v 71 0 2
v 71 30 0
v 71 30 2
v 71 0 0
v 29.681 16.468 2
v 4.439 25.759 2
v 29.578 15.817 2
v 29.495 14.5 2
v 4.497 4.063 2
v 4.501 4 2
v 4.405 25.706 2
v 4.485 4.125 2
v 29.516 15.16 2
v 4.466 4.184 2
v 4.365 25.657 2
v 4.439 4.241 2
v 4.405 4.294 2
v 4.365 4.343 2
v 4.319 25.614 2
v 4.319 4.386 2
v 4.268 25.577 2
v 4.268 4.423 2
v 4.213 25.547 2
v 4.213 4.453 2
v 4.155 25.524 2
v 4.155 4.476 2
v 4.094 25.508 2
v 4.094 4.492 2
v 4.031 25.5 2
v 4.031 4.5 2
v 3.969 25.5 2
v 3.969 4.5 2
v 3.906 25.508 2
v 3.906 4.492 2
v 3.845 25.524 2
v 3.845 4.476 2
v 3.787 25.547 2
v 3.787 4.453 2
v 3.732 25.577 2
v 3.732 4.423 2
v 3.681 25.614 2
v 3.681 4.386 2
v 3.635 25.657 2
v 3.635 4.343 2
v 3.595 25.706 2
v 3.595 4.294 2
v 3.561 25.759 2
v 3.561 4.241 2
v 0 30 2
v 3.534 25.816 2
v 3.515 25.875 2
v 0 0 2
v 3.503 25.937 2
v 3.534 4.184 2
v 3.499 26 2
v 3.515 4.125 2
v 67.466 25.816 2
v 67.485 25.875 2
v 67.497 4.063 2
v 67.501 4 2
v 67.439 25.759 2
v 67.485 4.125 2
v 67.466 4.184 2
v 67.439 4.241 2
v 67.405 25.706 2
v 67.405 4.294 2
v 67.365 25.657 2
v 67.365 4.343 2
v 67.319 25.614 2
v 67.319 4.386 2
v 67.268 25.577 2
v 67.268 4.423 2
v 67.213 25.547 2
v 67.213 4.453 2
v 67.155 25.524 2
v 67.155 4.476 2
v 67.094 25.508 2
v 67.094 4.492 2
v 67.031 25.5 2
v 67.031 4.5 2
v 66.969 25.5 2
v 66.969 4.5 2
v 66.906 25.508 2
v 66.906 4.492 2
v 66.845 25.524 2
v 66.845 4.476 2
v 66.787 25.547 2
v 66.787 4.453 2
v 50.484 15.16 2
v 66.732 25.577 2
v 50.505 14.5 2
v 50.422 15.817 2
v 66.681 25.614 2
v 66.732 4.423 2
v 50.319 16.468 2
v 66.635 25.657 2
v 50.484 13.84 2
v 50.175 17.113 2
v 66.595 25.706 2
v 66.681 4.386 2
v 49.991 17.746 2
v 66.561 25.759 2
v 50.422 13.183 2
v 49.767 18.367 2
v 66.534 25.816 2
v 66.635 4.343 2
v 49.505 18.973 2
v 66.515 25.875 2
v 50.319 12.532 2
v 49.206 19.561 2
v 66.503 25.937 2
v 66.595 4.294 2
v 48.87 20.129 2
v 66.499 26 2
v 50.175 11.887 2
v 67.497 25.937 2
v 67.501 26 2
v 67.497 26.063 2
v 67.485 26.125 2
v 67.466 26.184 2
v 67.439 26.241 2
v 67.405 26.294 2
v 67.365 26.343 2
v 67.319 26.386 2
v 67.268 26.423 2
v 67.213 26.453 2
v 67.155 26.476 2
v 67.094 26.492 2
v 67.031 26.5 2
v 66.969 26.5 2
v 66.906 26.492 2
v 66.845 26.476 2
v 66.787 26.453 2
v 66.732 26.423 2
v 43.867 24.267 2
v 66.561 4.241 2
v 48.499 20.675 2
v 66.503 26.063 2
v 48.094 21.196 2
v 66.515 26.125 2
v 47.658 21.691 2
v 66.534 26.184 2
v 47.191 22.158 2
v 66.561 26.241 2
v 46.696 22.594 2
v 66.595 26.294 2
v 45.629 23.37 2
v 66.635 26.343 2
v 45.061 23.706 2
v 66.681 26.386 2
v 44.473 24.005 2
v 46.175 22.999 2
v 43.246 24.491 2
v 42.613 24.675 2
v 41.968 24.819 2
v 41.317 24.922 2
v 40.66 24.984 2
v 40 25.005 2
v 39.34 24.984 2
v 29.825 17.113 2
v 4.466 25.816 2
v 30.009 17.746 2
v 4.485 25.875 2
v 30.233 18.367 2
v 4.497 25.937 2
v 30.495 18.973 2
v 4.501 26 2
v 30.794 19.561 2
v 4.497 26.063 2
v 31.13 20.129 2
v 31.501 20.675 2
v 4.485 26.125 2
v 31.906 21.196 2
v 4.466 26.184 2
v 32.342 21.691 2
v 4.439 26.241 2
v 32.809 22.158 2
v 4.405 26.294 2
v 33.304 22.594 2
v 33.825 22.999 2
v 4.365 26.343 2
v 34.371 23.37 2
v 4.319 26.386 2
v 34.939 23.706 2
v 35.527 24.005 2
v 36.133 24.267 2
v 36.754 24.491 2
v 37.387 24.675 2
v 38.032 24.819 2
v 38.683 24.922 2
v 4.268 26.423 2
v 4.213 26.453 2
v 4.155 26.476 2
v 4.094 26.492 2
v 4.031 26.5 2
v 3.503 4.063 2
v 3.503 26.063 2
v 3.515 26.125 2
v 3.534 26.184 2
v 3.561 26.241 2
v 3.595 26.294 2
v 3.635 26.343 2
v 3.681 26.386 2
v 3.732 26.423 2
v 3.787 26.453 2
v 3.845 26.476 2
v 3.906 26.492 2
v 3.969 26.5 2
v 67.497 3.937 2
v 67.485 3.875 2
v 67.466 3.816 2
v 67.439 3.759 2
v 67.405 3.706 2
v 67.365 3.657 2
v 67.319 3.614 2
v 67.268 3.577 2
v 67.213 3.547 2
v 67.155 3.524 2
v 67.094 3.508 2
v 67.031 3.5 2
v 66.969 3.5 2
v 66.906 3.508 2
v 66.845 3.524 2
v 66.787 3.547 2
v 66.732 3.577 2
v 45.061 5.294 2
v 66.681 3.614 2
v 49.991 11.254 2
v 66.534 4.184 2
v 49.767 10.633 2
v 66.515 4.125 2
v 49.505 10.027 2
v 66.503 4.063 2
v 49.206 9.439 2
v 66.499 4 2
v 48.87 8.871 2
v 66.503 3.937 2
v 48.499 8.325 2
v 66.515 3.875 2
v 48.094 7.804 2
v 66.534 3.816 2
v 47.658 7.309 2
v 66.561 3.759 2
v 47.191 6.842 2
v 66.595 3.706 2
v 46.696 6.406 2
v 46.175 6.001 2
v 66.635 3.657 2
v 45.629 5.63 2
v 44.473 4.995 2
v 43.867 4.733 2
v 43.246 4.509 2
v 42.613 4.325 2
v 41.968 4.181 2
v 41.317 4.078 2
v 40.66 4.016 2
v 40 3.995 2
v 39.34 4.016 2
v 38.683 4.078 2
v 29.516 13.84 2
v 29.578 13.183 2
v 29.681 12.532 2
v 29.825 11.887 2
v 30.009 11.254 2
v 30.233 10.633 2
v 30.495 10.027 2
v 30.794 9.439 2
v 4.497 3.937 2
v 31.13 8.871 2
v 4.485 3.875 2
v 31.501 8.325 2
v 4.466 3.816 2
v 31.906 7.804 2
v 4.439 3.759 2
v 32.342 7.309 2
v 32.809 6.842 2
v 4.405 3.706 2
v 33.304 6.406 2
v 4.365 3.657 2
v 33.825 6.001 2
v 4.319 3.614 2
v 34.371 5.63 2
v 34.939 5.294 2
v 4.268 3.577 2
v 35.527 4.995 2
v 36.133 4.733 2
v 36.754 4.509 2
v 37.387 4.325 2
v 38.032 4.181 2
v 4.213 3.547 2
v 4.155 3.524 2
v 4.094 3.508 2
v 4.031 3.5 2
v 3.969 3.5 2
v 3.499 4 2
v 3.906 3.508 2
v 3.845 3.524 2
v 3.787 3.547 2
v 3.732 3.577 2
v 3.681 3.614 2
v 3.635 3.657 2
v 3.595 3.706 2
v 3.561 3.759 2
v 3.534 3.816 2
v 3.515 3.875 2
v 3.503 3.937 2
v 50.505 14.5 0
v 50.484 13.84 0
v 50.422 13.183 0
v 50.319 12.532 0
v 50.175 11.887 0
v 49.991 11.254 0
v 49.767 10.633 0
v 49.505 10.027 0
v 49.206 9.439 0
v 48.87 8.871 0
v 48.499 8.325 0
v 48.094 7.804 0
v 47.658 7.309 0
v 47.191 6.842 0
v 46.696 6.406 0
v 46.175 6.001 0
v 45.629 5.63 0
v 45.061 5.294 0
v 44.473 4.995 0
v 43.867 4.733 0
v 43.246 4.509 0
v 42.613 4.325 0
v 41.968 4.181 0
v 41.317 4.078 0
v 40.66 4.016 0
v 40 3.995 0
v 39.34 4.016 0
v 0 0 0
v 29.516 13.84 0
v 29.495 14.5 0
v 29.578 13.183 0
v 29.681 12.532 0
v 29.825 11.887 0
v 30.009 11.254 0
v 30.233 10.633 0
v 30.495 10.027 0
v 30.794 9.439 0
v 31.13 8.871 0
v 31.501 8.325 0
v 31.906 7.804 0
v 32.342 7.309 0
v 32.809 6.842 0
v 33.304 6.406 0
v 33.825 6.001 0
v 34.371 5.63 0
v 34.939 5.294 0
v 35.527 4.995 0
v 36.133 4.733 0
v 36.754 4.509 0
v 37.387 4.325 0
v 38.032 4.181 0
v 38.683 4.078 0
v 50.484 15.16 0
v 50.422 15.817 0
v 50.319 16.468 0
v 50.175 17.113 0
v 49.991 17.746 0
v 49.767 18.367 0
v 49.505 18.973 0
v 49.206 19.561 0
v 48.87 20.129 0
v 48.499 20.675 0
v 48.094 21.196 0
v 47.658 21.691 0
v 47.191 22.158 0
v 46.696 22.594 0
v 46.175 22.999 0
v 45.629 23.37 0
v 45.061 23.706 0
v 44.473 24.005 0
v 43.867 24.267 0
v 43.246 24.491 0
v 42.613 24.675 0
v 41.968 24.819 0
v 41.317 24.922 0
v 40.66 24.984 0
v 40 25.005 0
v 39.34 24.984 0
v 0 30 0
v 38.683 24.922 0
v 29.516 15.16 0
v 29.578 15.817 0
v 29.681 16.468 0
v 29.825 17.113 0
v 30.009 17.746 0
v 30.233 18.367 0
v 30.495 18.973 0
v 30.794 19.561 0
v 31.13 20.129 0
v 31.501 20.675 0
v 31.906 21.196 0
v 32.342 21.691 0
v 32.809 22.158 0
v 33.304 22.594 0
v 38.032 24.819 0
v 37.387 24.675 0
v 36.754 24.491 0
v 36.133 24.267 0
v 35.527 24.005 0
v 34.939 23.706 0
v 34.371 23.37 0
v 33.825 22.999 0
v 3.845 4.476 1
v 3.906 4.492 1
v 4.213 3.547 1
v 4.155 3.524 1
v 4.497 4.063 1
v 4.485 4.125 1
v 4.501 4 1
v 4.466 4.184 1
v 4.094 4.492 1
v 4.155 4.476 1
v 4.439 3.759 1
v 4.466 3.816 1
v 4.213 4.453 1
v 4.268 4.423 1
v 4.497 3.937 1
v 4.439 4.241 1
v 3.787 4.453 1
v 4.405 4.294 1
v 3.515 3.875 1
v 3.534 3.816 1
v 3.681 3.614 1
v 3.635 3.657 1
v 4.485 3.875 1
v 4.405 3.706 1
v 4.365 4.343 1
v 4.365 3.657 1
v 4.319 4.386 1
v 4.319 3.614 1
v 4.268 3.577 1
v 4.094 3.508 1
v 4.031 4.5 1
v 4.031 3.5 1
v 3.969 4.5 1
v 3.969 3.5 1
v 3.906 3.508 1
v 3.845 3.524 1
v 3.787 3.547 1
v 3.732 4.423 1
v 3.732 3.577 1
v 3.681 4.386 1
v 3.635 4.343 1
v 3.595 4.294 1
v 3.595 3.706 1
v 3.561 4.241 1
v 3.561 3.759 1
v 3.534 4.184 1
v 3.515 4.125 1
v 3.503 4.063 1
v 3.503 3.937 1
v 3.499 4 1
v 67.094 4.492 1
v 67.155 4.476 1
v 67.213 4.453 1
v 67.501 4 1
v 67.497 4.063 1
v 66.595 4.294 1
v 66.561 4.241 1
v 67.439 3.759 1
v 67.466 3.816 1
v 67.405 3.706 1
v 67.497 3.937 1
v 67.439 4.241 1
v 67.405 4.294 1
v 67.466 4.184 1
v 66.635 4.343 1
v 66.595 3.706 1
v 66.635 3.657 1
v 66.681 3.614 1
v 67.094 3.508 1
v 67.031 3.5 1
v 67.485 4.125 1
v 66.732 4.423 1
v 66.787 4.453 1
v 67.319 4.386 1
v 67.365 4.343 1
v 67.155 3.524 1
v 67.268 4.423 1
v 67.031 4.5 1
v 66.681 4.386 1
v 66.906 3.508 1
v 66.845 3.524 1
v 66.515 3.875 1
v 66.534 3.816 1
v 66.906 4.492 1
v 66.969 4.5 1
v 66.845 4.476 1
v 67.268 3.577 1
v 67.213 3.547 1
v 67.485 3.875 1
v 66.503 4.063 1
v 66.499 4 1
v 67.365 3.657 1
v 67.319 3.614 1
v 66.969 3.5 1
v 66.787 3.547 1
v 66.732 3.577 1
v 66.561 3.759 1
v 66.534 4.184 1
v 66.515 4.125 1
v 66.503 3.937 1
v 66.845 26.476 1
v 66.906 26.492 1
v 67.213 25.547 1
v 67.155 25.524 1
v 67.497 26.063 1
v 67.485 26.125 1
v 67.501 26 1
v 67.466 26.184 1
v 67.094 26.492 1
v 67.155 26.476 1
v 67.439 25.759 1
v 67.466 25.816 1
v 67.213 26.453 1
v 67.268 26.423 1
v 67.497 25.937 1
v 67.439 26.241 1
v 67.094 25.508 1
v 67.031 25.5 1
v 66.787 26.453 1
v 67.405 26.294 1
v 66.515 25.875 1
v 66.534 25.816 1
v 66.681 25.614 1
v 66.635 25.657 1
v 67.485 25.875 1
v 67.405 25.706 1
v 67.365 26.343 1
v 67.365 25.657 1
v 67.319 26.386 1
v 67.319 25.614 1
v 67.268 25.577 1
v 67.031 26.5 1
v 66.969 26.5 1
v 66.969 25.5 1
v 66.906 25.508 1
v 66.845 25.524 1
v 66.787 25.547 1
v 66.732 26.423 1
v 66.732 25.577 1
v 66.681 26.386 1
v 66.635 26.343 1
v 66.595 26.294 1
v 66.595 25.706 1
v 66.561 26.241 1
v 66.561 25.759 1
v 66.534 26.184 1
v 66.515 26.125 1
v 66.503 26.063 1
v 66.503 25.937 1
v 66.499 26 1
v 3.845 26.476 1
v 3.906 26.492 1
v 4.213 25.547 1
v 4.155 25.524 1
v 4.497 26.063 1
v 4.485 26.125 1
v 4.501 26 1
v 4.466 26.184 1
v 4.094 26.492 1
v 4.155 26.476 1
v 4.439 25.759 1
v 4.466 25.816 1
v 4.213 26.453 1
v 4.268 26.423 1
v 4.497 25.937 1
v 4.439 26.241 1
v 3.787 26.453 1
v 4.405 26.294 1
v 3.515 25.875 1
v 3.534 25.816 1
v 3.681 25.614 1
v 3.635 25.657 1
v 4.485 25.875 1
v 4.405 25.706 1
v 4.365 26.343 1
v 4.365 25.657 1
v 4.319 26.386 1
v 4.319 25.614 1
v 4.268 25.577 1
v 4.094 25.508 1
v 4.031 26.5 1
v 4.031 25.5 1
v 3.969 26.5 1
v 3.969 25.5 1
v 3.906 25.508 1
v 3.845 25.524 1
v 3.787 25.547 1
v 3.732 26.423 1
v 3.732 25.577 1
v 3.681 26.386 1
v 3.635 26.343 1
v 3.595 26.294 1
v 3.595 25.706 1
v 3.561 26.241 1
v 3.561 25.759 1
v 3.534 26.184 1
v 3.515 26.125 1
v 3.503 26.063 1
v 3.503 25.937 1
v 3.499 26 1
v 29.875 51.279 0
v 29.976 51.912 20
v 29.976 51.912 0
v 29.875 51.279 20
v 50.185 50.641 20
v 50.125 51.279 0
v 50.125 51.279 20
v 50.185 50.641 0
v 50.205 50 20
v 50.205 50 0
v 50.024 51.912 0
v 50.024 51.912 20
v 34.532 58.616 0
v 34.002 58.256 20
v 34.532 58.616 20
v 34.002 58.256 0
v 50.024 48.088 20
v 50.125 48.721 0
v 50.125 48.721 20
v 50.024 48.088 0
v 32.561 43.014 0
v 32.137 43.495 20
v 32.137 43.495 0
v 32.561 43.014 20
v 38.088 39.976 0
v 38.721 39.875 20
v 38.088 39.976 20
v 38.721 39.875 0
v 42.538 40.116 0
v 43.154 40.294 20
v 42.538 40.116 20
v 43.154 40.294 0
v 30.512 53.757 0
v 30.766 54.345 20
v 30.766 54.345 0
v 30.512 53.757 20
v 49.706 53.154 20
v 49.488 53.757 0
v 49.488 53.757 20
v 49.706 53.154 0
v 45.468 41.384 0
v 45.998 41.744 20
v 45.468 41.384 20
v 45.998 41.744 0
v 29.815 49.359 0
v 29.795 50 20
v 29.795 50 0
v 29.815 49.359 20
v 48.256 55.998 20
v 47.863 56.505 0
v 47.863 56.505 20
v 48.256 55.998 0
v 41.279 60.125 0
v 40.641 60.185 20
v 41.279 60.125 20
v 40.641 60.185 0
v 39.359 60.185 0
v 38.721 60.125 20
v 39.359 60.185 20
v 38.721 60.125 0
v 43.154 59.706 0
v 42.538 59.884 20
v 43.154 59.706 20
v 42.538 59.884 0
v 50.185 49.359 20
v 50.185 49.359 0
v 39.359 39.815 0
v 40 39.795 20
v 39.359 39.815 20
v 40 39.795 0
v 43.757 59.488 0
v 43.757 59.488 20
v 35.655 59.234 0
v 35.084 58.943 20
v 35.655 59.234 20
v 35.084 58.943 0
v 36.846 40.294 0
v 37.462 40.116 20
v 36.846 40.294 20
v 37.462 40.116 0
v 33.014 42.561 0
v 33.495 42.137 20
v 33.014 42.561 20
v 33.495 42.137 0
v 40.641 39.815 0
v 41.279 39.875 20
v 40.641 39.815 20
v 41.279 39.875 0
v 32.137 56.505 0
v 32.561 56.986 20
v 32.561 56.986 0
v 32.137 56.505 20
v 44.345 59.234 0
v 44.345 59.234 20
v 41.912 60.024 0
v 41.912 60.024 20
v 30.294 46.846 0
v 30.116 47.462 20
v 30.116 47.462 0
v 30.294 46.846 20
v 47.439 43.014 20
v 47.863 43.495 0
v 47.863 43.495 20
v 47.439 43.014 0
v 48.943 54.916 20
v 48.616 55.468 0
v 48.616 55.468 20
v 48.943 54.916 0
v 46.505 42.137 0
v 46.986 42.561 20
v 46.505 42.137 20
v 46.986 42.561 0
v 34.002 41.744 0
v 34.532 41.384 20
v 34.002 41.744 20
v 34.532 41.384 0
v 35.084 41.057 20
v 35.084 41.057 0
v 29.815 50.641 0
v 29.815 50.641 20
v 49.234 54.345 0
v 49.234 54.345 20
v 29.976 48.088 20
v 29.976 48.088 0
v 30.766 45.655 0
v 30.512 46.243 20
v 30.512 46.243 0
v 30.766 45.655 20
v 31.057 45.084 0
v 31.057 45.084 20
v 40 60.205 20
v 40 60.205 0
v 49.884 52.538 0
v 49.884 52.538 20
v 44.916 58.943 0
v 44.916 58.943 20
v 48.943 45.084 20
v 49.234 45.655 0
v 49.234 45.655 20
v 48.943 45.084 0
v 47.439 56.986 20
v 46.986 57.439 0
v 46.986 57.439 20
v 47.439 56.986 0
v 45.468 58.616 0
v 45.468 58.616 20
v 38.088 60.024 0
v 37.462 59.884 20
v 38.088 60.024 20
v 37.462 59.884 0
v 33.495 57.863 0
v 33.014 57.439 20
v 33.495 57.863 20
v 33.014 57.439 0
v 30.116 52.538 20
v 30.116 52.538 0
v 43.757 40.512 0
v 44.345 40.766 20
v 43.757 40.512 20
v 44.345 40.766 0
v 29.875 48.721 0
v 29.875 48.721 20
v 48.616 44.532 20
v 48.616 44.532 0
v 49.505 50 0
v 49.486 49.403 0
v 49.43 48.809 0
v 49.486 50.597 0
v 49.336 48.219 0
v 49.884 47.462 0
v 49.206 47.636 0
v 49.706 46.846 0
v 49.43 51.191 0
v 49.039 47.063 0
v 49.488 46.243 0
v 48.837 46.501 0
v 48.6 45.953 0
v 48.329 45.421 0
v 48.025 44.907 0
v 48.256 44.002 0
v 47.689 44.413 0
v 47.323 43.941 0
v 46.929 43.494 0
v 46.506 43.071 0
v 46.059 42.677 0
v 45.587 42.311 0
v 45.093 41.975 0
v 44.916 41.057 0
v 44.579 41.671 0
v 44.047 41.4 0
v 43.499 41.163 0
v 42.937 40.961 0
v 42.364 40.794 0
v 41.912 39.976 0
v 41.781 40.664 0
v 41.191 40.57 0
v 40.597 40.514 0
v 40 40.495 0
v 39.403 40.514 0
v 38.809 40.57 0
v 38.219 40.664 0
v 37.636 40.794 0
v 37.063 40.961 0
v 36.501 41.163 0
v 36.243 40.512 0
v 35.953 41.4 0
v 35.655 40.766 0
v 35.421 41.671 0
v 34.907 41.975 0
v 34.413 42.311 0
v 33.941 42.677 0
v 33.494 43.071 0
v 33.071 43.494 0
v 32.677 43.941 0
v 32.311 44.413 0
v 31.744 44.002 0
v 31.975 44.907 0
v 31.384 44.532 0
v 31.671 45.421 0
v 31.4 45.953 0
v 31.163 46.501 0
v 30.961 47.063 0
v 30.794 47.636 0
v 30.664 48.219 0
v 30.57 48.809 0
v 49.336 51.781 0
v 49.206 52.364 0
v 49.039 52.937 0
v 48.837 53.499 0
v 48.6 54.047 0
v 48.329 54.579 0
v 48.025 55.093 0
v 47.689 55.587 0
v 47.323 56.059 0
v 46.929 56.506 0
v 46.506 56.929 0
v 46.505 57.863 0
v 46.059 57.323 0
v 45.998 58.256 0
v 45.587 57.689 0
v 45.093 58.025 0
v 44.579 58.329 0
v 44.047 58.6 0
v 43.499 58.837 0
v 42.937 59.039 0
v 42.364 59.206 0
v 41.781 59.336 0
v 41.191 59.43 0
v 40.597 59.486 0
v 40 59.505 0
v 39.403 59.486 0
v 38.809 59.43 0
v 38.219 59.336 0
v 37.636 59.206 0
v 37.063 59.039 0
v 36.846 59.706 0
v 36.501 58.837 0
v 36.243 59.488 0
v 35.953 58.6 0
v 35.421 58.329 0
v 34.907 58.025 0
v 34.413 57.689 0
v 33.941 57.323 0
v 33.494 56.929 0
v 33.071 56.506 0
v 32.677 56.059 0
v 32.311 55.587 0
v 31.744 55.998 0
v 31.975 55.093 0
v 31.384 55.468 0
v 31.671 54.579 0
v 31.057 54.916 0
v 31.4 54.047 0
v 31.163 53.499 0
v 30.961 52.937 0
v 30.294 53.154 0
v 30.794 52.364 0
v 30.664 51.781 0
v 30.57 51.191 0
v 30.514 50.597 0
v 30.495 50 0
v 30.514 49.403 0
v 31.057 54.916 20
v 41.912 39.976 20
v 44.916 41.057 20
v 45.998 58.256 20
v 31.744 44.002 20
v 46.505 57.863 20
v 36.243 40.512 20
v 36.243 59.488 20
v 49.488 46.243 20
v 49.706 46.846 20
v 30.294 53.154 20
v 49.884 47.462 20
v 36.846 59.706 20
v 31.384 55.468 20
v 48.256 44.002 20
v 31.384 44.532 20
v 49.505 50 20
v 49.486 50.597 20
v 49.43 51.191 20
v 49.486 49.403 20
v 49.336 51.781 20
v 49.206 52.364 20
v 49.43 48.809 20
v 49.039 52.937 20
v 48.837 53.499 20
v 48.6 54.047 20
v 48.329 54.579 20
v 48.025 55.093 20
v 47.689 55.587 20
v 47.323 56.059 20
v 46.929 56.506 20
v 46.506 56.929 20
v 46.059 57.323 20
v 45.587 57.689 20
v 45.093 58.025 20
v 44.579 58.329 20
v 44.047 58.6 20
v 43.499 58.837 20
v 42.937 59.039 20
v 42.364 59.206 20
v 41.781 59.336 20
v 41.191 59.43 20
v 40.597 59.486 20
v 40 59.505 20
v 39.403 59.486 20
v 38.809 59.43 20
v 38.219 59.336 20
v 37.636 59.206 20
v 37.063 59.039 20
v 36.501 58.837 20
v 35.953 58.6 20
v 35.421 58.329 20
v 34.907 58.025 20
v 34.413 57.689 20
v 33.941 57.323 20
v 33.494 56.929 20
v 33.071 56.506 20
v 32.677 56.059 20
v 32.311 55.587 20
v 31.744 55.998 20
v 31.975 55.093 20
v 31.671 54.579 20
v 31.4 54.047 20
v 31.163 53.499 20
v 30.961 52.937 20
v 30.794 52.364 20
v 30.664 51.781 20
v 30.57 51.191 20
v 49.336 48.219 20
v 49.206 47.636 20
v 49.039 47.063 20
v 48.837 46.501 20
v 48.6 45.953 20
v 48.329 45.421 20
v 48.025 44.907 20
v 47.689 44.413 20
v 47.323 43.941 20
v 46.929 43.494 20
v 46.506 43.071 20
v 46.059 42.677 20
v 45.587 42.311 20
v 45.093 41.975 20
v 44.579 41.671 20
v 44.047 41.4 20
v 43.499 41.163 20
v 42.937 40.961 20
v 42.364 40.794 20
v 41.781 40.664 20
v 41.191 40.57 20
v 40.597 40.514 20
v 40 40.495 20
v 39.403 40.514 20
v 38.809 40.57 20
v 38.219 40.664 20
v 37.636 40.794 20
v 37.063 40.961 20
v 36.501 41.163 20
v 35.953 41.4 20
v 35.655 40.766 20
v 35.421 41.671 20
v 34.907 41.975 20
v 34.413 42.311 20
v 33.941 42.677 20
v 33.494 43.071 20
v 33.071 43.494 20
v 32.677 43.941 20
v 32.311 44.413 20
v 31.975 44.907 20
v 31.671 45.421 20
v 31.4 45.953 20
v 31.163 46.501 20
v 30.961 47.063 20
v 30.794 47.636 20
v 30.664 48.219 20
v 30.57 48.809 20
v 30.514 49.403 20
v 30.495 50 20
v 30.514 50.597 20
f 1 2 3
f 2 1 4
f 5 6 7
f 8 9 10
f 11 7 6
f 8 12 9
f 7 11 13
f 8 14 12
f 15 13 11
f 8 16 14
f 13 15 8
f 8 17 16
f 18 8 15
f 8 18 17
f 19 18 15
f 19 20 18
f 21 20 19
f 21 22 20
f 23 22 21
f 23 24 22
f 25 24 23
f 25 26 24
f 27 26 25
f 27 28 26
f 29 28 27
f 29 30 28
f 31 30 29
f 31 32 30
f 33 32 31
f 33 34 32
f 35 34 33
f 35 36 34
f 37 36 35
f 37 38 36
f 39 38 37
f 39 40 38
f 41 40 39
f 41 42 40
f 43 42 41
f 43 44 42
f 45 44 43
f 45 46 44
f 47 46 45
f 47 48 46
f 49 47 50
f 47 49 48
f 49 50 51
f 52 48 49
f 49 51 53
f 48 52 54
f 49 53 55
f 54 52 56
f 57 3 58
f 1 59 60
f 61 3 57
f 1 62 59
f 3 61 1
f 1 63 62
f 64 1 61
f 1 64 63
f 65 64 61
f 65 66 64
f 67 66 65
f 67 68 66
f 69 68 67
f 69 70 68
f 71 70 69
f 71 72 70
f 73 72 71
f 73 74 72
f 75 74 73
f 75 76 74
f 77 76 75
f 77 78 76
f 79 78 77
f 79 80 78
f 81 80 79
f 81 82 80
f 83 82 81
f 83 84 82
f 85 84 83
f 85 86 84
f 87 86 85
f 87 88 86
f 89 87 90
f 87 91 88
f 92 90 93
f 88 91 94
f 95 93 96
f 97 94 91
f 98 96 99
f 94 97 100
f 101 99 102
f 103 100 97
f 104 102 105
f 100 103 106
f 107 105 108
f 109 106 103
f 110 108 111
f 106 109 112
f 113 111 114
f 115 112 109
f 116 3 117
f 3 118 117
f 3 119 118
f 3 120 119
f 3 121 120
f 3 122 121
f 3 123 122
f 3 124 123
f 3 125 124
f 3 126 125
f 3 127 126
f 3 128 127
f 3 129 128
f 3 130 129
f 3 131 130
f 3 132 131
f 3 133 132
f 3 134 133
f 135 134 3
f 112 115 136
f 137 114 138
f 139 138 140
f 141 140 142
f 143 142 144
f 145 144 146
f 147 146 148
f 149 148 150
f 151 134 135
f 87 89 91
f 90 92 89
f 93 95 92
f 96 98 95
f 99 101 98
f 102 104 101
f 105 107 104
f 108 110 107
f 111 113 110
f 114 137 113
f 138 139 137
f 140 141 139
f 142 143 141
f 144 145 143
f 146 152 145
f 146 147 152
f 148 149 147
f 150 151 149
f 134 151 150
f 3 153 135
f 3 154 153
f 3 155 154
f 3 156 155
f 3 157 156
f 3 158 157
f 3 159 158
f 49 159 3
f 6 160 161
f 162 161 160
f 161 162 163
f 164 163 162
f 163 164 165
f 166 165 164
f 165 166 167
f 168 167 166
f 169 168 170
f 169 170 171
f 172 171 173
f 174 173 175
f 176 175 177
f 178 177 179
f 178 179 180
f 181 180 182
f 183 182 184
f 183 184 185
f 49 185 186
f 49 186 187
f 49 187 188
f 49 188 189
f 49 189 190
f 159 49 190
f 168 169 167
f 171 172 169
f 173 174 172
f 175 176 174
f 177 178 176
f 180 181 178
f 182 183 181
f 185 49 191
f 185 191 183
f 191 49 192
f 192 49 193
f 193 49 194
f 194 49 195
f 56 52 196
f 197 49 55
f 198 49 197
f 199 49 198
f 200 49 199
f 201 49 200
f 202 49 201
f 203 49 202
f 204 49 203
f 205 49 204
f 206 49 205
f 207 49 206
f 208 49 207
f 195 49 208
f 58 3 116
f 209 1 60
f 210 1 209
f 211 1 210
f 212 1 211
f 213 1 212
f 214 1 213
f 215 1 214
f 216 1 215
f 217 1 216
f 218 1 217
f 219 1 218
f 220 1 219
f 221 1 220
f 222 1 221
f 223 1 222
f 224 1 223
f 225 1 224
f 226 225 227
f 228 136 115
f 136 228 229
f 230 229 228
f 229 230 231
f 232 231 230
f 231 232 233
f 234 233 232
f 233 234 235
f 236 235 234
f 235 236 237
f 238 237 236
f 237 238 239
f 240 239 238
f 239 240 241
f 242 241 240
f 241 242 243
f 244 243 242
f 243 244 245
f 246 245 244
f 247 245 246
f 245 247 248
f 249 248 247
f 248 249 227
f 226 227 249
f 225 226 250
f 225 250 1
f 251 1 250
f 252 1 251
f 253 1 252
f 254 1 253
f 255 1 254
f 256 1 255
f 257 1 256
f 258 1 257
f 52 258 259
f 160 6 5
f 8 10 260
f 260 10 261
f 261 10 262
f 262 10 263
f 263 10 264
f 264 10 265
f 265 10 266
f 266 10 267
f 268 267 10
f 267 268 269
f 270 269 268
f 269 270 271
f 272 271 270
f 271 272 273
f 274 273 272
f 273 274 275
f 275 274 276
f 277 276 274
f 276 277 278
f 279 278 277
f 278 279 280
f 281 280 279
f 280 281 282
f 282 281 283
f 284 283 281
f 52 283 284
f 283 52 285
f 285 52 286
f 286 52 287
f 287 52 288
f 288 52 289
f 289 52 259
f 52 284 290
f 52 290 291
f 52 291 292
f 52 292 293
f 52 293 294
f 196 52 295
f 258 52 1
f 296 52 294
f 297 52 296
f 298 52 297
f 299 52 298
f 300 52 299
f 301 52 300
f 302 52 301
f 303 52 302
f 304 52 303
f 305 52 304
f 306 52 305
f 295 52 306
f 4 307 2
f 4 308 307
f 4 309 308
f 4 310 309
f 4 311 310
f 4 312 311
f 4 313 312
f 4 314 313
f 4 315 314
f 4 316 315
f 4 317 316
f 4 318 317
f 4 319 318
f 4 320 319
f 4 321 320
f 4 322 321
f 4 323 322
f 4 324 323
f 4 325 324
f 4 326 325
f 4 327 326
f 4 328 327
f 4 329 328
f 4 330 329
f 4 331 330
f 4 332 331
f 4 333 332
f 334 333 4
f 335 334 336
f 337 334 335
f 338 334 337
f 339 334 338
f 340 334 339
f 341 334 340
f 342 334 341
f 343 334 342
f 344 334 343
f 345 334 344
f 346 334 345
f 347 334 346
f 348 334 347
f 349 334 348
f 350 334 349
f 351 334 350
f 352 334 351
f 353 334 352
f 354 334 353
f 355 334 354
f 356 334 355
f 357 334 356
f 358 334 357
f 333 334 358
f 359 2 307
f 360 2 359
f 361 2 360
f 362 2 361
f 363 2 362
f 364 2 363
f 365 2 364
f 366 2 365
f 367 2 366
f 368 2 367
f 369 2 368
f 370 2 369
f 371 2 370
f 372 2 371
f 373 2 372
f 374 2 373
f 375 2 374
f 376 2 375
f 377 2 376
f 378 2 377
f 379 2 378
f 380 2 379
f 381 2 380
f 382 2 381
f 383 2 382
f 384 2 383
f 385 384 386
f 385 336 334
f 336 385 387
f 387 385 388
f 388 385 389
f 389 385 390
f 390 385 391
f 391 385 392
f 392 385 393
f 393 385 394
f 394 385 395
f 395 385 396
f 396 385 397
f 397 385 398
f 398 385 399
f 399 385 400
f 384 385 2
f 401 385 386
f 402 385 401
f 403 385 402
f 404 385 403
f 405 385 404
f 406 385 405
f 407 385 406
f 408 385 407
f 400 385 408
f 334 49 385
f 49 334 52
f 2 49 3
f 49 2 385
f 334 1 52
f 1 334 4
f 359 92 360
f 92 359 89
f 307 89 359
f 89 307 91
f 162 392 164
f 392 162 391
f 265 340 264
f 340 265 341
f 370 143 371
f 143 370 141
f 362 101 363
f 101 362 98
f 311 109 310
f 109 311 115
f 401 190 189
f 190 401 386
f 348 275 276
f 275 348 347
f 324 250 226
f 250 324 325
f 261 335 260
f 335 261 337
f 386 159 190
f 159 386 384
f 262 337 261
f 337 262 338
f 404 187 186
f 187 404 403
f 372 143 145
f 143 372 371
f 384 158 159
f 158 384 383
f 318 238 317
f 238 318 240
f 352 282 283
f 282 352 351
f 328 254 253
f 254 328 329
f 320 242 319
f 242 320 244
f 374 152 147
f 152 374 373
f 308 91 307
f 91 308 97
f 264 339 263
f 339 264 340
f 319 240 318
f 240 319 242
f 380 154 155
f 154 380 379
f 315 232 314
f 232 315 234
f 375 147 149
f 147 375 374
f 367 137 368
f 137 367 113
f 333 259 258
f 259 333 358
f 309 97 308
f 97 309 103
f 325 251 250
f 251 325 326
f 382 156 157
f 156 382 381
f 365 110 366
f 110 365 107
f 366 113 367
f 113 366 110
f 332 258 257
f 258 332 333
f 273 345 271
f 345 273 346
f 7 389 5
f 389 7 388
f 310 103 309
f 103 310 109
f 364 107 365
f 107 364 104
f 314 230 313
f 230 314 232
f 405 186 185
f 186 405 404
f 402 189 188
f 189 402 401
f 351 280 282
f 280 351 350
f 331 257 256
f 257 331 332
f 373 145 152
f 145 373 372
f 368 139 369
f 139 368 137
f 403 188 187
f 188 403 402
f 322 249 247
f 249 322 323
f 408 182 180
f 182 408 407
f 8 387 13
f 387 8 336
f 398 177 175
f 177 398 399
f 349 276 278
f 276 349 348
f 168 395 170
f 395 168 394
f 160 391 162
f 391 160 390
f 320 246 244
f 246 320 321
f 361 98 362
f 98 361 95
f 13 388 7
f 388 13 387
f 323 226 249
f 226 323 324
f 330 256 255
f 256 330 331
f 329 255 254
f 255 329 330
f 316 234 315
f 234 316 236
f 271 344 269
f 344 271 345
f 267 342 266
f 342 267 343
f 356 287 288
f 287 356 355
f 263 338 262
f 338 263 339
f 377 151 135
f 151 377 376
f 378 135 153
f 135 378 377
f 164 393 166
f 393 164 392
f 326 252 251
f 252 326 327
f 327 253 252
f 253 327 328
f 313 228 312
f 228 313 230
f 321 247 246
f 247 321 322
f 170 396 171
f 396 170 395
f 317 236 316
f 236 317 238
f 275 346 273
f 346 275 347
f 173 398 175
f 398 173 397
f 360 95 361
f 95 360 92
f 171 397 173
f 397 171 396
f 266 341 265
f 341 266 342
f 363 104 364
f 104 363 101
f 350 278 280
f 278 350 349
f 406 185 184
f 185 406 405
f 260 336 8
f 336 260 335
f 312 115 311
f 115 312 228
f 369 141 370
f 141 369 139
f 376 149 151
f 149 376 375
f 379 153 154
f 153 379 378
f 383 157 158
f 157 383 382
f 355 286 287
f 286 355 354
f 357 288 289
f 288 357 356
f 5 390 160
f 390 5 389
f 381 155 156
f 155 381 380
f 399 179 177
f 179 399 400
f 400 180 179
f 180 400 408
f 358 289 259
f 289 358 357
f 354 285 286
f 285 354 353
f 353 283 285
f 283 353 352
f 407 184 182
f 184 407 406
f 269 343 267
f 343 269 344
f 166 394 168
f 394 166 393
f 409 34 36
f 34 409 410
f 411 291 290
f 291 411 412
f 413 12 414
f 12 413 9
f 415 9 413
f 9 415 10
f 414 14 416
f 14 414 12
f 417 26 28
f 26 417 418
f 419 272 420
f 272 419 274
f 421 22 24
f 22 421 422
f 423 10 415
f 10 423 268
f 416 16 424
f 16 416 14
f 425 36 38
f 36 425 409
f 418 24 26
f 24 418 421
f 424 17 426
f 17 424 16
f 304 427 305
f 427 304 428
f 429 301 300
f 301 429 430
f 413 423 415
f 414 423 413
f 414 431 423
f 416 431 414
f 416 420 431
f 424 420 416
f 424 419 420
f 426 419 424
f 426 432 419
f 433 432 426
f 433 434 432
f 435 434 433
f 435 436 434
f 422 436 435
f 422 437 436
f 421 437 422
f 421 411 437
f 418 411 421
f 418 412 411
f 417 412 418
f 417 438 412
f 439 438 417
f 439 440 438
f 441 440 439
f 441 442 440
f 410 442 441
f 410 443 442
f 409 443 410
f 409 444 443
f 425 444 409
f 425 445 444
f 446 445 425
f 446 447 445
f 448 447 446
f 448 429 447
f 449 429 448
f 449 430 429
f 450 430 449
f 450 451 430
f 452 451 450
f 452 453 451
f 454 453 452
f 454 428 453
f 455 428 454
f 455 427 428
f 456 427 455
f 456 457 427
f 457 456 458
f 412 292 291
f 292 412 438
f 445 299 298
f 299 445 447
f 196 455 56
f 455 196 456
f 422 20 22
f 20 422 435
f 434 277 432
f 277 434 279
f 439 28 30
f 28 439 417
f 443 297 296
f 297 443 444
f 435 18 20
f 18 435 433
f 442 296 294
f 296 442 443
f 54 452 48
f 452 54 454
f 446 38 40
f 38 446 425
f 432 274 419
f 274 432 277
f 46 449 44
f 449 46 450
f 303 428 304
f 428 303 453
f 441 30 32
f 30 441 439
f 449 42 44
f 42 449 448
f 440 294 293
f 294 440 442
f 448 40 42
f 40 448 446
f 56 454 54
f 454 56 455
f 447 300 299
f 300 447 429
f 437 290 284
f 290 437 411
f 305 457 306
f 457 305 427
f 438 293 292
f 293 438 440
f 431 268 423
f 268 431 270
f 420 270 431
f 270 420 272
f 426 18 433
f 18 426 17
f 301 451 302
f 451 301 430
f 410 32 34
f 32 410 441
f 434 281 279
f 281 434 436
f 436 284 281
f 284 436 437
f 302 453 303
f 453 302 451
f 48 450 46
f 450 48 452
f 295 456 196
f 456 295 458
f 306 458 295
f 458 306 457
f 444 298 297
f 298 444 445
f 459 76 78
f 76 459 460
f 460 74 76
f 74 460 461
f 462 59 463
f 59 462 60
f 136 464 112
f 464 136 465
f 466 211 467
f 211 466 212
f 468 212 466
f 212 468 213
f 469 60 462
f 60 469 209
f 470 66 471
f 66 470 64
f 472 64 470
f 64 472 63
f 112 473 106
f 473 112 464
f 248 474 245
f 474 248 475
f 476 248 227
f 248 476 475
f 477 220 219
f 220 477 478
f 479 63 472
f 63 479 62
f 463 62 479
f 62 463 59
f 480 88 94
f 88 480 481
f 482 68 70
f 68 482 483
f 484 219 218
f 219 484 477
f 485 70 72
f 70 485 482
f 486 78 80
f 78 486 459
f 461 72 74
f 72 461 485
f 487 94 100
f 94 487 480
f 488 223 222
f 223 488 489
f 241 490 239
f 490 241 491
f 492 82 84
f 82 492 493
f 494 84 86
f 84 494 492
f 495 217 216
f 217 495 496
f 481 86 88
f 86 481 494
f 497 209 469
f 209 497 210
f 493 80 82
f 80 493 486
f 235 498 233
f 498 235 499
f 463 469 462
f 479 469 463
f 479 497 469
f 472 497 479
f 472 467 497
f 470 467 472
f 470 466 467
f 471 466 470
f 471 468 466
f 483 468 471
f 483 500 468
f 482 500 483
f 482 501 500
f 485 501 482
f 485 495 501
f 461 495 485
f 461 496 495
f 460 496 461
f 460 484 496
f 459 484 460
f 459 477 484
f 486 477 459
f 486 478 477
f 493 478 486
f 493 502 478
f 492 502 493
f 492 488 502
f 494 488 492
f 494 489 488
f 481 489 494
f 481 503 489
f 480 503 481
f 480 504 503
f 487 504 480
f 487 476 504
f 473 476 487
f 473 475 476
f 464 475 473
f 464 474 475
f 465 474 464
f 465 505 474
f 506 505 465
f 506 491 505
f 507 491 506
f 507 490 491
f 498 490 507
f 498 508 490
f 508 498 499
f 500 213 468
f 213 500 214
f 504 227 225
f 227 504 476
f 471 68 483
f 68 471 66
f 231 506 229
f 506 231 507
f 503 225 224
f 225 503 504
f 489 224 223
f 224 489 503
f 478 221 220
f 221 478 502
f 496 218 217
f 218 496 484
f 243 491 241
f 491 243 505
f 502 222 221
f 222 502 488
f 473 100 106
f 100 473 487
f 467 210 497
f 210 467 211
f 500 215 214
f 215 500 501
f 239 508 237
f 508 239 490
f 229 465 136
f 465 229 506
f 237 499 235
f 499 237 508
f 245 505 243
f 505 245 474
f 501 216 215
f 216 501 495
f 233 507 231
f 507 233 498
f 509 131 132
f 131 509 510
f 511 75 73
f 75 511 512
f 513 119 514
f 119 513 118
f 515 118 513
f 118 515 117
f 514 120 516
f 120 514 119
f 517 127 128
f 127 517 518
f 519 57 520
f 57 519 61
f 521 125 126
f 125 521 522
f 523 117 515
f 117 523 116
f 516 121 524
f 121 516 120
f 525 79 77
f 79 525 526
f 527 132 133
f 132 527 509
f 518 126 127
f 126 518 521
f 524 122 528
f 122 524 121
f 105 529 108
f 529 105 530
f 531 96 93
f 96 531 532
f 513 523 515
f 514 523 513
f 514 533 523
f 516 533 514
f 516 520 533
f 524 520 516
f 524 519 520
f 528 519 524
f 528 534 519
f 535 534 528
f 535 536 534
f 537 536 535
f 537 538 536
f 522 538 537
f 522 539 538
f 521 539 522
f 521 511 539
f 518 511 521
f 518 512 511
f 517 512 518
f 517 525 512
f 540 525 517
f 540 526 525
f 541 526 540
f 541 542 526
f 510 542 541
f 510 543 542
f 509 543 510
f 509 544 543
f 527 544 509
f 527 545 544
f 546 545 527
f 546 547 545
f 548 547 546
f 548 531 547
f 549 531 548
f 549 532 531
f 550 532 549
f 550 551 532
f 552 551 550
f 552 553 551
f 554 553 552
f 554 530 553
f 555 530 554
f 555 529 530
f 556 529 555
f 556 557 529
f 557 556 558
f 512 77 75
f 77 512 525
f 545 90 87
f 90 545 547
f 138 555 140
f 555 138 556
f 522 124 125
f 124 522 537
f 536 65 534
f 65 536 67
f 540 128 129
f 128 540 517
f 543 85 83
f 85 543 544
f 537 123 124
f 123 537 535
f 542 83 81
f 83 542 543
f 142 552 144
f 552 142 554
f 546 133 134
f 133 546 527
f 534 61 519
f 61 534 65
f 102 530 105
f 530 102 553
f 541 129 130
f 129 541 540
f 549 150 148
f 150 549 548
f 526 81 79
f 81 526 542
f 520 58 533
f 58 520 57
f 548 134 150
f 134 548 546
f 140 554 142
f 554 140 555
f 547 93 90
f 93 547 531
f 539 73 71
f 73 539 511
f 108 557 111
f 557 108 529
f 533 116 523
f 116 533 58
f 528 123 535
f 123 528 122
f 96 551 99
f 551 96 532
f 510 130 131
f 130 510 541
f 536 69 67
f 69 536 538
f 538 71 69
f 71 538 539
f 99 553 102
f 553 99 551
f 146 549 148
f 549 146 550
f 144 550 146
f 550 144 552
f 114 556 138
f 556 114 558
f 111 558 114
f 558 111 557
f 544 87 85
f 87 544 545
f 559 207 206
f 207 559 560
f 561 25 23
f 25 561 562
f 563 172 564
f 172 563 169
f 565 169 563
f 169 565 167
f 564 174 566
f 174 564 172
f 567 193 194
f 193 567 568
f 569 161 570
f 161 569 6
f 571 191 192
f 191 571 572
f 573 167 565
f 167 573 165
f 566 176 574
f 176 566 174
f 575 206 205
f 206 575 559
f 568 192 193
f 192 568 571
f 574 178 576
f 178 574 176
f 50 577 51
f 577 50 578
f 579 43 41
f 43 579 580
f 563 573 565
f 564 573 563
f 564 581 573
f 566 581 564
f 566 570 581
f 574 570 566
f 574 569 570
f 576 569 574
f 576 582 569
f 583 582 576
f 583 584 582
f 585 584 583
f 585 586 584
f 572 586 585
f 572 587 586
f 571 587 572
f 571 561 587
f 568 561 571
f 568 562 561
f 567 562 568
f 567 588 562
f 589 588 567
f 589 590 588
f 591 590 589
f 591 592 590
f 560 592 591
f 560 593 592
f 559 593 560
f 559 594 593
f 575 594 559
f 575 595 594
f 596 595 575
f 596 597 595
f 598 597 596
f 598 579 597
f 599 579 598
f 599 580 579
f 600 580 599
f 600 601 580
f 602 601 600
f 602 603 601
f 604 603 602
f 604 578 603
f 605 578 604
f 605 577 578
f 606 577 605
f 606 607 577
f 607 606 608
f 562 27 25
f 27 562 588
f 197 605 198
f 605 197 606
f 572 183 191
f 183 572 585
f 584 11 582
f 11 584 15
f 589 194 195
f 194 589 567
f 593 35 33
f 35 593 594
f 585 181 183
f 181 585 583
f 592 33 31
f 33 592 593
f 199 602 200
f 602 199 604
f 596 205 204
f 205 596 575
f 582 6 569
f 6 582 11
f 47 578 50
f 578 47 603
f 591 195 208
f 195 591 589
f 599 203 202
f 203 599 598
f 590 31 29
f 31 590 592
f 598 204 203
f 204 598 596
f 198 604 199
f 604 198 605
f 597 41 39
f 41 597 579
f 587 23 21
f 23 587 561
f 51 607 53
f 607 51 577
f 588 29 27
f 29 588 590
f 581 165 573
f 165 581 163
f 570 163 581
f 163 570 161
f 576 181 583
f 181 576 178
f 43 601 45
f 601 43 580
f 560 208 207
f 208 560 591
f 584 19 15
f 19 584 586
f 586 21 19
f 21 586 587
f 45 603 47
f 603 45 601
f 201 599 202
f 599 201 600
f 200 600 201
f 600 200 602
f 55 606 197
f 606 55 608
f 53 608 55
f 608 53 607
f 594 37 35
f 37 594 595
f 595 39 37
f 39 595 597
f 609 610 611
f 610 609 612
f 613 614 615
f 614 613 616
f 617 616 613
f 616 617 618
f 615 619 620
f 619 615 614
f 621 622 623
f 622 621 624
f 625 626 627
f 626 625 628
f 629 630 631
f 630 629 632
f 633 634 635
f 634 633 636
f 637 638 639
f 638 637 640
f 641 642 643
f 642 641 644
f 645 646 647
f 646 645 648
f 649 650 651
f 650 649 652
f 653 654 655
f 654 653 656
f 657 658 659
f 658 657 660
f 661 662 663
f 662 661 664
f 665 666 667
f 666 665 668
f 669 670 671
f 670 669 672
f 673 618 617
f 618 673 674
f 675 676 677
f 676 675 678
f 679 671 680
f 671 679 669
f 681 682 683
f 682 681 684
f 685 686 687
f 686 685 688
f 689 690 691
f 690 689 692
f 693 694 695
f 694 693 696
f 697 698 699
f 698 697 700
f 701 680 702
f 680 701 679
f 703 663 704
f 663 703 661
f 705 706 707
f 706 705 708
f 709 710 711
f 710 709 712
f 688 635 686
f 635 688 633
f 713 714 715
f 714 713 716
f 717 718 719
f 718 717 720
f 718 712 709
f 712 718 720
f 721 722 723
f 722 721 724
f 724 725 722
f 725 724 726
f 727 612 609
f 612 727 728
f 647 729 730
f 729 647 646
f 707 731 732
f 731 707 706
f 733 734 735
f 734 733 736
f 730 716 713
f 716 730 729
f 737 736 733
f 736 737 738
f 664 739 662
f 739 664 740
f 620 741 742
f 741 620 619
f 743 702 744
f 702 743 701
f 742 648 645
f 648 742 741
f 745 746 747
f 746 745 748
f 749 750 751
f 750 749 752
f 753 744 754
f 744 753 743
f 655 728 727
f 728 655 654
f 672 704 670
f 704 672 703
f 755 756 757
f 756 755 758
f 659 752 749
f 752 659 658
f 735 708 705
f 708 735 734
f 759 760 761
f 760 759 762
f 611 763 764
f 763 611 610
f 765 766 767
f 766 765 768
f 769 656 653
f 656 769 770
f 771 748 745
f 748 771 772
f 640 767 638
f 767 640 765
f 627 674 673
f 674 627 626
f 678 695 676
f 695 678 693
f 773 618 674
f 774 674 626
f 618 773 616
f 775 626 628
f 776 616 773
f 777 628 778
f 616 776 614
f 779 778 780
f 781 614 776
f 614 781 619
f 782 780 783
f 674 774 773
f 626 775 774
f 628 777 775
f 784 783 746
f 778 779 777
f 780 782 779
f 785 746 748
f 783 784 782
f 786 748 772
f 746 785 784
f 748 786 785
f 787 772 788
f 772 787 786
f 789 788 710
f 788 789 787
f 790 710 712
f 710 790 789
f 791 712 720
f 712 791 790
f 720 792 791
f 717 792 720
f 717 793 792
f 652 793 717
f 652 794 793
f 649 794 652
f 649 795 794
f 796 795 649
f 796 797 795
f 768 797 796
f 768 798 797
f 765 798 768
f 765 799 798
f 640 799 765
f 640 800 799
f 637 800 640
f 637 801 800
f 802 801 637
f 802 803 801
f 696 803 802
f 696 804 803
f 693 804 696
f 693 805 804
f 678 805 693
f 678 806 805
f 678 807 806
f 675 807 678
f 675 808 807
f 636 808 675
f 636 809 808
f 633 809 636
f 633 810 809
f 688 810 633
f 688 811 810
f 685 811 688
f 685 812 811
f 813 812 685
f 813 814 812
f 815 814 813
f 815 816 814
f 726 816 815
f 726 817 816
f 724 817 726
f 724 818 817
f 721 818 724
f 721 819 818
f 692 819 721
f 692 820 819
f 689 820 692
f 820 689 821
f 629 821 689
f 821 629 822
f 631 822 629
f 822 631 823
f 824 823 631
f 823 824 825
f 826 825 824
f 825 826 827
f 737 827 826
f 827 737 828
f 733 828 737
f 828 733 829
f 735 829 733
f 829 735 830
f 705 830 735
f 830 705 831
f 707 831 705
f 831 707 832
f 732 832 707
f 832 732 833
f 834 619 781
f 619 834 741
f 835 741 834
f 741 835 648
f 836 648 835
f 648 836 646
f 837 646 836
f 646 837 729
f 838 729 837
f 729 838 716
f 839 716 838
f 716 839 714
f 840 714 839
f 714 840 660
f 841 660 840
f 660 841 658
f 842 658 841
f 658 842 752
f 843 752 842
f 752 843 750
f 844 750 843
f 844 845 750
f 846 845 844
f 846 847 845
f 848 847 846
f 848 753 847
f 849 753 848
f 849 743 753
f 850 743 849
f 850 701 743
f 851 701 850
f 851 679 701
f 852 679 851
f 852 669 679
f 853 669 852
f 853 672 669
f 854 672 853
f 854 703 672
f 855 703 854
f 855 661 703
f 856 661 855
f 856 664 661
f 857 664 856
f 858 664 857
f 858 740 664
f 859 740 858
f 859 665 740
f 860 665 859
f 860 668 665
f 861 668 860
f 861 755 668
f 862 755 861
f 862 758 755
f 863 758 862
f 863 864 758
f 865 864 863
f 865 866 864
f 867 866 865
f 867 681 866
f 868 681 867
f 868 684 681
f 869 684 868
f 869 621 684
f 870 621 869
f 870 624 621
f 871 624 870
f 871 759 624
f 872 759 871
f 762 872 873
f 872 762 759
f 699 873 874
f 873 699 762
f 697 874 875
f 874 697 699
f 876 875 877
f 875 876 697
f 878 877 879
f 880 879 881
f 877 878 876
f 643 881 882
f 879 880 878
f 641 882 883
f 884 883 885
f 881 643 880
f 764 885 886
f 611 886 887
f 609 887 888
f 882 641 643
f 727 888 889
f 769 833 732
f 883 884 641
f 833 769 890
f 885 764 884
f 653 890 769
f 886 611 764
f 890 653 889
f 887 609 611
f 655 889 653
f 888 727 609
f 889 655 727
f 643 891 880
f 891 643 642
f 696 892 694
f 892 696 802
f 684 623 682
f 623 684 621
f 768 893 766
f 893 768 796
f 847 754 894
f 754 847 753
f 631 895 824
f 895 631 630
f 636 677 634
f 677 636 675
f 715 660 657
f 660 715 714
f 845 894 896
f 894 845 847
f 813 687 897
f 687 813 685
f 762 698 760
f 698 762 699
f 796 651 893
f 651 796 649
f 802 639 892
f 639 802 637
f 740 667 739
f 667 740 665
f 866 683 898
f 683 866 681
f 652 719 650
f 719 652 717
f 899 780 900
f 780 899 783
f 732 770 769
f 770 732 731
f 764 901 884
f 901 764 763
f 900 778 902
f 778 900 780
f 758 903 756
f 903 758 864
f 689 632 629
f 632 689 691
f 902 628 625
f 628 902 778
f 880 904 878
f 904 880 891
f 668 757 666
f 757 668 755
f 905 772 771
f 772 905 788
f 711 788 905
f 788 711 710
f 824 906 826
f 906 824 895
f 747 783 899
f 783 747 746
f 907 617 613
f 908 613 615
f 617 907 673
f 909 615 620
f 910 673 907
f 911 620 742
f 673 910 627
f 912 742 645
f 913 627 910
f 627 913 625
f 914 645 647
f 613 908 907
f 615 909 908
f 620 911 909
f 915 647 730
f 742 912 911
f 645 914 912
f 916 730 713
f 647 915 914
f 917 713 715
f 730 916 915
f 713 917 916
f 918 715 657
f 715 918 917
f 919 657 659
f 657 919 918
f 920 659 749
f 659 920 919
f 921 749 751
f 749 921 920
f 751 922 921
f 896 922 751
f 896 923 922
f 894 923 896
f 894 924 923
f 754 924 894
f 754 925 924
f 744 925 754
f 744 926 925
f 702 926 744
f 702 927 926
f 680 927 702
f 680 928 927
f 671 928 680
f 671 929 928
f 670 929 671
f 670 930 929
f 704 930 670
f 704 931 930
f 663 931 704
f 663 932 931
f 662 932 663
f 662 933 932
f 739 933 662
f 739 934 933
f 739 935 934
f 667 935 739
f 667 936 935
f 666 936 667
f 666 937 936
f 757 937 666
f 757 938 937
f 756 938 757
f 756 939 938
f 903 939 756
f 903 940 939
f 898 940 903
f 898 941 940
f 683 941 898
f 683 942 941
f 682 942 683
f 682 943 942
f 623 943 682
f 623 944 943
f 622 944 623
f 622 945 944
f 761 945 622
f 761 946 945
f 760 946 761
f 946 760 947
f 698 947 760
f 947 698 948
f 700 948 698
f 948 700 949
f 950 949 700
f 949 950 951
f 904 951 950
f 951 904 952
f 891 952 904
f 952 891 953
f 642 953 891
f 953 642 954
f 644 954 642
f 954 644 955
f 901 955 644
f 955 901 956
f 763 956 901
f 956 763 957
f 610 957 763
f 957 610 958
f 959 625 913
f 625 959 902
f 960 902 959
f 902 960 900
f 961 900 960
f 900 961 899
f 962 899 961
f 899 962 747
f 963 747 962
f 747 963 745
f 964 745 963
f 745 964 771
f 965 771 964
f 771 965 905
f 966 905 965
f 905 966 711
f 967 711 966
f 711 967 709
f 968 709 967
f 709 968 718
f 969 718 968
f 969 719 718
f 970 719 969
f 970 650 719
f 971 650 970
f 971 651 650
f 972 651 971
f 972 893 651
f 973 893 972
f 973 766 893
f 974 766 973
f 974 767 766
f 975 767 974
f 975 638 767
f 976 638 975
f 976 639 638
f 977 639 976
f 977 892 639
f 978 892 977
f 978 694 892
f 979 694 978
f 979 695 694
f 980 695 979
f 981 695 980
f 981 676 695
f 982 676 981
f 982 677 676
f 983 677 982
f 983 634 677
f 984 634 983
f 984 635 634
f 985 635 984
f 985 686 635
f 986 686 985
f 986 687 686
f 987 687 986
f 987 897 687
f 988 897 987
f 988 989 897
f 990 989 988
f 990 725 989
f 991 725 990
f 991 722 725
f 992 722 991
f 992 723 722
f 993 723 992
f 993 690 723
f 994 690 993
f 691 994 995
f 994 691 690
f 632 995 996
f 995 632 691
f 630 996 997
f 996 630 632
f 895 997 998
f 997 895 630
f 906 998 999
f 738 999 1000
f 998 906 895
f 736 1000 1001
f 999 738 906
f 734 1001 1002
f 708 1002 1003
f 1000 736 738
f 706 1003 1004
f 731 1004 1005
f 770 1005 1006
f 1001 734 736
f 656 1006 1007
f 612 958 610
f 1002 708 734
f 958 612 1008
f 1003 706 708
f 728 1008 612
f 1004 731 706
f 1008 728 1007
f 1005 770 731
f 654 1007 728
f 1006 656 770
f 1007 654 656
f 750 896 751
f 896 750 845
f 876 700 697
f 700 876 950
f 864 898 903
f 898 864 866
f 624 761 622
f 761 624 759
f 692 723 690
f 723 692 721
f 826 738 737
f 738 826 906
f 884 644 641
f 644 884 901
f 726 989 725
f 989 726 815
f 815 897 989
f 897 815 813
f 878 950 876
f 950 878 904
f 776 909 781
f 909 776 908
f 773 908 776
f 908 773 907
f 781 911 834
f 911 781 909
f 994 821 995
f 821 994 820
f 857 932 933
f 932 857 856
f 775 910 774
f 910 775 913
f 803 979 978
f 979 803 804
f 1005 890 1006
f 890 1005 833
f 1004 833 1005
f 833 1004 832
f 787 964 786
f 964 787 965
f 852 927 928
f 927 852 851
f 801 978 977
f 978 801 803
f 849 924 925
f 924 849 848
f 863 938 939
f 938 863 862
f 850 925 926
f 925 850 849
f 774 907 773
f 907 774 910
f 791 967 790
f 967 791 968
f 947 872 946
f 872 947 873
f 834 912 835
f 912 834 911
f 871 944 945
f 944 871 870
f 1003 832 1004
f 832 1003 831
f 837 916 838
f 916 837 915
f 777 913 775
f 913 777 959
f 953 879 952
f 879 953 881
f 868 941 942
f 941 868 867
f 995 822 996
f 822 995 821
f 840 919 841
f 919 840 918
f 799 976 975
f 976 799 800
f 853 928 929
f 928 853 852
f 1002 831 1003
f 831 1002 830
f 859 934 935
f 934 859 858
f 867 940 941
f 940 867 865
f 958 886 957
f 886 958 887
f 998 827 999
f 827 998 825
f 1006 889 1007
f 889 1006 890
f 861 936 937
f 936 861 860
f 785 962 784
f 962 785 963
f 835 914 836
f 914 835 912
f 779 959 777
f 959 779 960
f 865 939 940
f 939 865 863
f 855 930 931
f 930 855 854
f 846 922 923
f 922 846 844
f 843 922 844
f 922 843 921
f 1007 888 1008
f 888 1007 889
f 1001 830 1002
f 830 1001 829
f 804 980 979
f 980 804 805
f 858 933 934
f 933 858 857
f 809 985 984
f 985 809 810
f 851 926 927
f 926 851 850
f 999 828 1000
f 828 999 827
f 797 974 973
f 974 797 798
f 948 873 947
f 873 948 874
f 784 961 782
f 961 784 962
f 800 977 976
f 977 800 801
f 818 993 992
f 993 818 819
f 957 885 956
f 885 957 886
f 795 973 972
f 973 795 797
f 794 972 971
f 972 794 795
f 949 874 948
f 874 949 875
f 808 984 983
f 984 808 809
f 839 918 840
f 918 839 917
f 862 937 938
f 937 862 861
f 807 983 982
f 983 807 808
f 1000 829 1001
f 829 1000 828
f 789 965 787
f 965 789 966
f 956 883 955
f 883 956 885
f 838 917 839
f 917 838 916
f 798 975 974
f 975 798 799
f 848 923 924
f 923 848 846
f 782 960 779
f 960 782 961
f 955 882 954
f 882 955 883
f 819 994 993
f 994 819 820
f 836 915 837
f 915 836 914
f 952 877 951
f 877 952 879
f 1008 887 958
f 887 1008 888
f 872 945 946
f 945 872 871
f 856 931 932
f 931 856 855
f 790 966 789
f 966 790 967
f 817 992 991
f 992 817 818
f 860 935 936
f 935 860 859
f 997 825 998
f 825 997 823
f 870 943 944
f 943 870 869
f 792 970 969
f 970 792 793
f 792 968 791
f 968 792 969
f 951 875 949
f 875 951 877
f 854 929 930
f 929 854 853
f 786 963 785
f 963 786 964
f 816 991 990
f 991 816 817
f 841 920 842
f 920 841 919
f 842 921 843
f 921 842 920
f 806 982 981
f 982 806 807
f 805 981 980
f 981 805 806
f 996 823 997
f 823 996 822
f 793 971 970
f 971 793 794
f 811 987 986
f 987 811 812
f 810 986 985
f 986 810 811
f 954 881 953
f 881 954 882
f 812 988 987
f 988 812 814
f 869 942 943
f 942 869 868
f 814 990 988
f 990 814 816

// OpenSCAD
// WMD

module cylinder_outer(height,radius,fn){
   fudge = 1/cos(180/fn);
   cylinder(h=height,r=radius*fudge,$fn=fn);
    }
 
difference() {
       // GSB Top
       translate([0,0,0]) {
        color([1,.5,.5])
        cube([71,30,2]);
       }
    
    // Objective Hole
    translate([40,14.5,-2]) {
        cylinder_outer(5,10.5,100);
    }

 // Top Nipple Holes
       translate([4,4,1]) {
           color([0,0,0])
           cylinder_outer(1.5, .5, 50);
       }
        translate([67,4,1]) {
           color([0,0,0])
           cylinder_outer(1.5, .5, 50);
       }
        translate([67,26,1]) {
           color([0,0,0])
           cylinder_outer(1.5, .5, 50);
       }
       translate([4,26,1]) {
           color([0,0,0])
           cylinder_outer(1.5, .5, 50);
       }
   }
 // Optical tube
       difference() {
       translate([40,50,0]) {
           // outer wall
           cylinder_outer(20, 10.2, 100);
       }
        // inner tube
       translate([40,50,-1]) {
       color([1,0,0])
       cylinder_outer(25, 9.5, 100);
    }
   }
